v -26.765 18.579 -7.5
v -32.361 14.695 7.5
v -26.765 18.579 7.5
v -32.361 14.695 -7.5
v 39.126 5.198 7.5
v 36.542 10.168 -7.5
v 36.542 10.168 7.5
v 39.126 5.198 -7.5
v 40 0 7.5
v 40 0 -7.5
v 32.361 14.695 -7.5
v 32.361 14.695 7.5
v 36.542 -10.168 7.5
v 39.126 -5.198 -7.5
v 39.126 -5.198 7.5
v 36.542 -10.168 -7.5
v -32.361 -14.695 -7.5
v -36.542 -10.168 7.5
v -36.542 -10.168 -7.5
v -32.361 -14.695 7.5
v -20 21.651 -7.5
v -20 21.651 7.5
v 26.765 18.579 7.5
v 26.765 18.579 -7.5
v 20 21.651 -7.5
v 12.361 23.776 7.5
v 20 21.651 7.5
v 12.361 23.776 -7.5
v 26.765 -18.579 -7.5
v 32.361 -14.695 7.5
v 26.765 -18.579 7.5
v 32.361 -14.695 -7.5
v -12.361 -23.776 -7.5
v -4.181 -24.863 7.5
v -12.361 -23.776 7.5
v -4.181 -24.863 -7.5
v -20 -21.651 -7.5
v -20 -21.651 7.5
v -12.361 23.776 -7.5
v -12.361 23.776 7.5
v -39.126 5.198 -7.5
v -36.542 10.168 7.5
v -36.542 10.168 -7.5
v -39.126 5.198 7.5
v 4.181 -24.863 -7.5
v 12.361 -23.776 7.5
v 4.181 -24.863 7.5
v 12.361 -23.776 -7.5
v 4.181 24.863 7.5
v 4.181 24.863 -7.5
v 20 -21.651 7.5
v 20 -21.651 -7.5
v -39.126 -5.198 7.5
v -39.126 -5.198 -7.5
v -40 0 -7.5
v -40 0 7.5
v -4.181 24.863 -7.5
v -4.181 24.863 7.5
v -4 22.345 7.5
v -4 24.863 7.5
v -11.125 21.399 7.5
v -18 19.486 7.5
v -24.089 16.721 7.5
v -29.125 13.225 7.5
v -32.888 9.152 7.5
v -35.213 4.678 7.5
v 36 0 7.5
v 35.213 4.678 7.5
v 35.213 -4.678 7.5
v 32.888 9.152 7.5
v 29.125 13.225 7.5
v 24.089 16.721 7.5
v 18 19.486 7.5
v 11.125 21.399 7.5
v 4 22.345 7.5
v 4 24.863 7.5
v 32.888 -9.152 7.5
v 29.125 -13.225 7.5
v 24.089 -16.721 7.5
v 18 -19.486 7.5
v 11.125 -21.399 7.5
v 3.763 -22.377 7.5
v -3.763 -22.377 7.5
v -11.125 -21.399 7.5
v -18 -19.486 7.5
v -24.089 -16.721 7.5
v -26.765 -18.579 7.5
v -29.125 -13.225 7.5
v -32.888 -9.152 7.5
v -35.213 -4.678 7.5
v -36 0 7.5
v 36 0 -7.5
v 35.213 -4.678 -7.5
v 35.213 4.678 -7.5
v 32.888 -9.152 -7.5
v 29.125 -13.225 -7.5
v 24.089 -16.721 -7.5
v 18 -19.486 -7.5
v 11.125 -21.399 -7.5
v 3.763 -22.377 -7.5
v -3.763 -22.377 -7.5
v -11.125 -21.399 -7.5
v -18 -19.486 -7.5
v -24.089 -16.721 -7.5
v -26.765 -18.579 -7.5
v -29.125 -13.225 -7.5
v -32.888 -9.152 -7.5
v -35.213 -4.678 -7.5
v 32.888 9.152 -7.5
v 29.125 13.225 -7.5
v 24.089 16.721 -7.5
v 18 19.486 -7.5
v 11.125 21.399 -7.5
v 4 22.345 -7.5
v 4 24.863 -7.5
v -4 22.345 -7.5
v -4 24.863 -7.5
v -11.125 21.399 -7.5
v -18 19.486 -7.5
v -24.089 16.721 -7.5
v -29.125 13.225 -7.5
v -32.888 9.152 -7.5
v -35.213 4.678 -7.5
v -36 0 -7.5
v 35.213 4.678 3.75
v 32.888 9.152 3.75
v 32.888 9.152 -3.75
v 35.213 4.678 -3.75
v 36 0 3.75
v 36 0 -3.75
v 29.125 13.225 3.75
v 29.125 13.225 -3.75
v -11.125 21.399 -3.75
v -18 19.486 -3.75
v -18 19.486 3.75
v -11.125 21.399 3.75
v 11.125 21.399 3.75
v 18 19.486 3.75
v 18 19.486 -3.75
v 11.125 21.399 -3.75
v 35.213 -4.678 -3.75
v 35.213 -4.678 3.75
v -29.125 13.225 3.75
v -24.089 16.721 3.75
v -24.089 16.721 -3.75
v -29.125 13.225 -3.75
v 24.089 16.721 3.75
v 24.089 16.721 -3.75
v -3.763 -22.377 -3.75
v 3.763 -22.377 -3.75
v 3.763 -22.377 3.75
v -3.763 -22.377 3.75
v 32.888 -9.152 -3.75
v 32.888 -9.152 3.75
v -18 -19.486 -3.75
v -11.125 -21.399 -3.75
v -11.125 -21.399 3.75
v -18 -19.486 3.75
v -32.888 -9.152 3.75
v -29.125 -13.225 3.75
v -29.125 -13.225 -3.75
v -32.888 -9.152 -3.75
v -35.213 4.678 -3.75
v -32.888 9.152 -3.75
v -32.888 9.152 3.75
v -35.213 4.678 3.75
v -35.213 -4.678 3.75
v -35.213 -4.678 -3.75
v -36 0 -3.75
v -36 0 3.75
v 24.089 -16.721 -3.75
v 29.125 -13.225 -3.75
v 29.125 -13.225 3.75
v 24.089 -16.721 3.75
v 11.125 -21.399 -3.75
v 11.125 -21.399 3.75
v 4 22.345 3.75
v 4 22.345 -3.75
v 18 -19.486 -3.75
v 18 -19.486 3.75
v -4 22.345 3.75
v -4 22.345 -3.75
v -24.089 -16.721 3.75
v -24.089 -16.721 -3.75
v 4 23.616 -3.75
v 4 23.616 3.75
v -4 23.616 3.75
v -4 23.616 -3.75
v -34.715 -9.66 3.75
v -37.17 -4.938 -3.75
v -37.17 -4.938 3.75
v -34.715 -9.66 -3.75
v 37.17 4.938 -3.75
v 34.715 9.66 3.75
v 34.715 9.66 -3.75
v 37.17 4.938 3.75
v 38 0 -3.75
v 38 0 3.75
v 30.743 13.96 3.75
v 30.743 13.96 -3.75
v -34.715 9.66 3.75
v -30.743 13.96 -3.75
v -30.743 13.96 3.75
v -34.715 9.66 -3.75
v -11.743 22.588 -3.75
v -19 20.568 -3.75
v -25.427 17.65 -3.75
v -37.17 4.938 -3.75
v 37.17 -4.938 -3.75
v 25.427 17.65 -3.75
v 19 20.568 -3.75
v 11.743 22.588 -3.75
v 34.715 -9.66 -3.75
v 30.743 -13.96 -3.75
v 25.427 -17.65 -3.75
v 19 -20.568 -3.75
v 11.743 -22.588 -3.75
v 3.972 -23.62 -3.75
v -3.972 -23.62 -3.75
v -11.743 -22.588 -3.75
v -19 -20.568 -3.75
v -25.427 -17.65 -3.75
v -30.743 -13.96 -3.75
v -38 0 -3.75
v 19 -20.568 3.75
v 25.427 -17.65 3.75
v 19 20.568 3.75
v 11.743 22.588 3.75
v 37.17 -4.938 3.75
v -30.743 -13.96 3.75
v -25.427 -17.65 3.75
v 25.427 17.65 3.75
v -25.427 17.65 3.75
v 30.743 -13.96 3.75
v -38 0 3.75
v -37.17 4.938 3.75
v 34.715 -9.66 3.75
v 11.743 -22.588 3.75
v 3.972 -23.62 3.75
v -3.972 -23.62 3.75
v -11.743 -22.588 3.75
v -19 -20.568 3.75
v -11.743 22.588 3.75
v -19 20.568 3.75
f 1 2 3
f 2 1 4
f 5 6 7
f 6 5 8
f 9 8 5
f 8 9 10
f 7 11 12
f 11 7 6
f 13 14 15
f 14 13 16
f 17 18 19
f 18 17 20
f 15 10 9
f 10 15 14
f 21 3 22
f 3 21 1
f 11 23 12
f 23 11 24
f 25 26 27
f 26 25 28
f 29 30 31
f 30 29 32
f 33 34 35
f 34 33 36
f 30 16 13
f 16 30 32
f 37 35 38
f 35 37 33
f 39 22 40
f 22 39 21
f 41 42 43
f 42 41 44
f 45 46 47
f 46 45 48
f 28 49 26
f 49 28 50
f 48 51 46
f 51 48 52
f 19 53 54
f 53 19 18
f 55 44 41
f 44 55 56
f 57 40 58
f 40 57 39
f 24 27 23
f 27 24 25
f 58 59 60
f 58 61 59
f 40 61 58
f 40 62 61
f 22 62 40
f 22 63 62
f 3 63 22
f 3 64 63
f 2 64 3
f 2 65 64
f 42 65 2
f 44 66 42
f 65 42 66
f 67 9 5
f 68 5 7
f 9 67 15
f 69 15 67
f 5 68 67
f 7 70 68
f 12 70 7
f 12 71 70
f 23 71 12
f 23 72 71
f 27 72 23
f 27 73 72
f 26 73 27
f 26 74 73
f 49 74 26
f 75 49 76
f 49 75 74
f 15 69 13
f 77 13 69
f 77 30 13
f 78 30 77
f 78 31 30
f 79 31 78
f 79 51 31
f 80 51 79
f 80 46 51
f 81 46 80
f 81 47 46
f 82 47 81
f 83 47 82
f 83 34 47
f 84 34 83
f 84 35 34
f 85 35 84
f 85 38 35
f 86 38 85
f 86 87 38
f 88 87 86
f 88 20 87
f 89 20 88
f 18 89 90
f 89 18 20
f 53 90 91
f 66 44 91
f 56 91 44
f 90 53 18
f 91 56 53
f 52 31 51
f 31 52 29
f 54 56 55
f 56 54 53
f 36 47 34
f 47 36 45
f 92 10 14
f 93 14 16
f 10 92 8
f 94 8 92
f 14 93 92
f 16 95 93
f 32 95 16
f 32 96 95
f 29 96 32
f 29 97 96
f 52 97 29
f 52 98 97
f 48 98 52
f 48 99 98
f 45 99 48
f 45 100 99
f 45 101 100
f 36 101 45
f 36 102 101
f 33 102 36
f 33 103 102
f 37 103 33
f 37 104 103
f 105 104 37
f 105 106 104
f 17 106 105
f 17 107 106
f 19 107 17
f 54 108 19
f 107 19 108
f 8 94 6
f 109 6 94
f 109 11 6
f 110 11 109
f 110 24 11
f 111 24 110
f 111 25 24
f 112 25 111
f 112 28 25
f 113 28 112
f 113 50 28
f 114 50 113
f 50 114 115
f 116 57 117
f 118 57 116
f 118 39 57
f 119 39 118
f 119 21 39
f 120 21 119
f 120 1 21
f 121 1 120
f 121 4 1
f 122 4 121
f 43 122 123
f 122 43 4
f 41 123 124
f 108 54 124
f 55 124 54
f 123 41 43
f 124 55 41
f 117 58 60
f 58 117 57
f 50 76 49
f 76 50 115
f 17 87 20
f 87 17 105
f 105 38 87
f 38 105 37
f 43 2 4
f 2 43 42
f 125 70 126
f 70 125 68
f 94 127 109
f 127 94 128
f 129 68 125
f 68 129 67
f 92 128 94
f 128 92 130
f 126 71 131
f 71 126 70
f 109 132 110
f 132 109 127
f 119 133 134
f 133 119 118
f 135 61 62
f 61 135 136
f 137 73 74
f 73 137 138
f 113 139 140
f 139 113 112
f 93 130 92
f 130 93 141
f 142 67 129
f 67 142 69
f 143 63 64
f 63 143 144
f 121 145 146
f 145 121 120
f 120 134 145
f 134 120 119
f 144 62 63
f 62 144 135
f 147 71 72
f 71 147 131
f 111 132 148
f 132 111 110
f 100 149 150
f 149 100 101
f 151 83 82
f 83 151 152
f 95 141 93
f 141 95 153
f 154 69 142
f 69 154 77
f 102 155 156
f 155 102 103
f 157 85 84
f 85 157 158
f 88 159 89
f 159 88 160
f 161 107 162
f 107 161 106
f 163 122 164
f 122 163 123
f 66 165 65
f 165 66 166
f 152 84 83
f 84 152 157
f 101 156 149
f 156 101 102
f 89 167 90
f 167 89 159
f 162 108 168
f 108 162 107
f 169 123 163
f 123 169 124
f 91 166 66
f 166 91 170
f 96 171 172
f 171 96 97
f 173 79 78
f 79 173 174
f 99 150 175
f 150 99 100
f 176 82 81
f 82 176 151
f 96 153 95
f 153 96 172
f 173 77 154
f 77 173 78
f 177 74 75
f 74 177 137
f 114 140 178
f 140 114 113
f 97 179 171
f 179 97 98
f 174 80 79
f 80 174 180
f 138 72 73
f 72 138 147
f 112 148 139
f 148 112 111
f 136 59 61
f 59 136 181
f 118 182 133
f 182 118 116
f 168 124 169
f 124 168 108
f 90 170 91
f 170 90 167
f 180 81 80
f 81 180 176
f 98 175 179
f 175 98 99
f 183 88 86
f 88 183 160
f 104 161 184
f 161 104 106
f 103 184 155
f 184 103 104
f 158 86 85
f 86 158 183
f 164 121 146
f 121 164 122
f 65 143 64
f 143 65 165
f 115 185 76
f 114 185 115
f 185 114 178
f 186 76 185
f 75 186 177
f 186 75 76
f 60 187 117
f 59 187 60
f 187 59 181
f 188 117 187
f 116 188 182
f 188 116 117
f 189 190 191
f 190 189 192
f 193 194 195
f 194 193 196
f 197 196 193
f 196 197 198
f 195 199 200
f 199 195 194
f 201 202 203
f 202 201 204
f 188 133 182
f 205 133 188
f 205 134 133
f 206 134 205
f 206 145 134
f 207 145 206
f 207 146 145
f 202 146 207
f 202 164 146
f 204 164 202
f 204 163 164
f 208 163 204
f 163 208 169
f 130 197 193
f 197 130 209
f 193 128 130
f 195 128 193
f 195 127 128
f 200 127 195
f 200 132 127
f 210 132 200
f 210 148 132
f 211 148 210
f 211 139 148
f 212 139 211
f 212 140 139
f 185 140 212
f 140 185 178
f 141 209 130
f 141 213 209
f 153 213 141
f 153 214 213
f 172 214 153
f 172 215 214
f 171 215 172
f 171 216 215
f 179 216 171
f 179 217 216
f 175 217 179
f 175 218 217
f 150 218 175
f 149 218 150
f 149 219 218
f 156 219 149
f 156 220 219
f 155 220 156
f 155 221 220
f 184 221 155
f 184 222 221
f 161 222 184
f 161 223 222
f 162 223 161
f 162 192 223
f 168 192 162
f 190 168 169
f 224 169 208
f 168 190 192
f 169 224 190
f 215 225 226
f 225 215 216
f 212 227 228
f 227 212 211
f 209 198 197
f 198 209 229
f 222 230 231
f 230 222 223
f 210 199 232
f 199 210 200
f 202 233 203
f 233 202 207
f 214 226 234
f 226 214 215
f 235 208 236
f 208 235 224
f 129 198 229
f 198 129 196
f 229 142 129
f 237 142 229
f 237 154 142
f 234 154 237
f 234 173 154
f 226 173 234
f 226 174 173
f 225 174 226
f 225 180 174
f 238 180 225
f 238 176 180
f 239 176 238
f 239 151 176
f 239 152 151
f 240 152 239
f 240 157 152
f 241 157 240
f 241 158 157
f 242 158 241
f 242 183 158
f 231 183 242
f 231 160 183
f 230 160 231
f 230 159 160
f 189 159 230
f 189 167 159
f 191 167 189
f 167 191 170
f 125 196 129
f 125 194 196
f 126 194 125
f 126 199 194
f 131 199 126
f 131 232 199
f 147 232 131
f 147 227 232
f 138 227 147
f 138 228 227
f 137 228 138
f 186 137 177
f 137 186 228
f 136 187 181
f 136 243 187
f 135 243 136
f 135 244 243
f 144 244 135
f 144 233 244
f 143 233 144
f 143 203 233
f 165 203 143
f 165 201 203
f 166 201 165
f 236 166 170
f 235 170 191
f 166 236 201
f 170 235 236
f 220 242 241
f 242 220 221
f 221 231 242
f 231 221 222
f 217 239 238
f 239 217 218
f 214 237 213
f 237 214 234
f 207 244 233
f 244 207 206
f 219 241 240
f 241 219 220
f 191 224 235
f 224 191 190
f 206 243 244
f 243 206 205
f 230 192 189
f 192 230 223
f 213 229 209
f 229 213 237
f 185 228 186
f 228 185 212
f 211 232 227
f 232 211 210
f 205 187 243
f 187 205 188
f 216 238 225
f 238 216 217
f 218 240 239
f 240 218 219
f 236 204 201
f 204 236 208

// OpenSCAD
// file: ../config.scad
width = 80;
height = 50;
depth=15;

thinkness=.1;
join=0.2;

quality=1000;
// main file
include <../config.scad> 

/**/
scale([width/2/quality,height/2/quality,depth/quality]){
    
    difference(){

        cylinder(h = 1*quality, r1 = 1*quality, r2 = 1*quality, center=true){
        }

        cylinder(h = 1*quality, r1 = (1-thinkness)*quality, r2 = 0.9*quality, center=true){
        }

        translate([0,(1-(thinkness/2))*quality,0]){
            cube([join*quality,thinkness*quality*2,1*quality],true){}
        }
        
        cylinder(h = 0.5*quality, r1 = (1-(thinkness/2))*quality, r2 = (1-(thinkness/2))*quality, center=true){
        }
    }
    
    
       

}
/**/
